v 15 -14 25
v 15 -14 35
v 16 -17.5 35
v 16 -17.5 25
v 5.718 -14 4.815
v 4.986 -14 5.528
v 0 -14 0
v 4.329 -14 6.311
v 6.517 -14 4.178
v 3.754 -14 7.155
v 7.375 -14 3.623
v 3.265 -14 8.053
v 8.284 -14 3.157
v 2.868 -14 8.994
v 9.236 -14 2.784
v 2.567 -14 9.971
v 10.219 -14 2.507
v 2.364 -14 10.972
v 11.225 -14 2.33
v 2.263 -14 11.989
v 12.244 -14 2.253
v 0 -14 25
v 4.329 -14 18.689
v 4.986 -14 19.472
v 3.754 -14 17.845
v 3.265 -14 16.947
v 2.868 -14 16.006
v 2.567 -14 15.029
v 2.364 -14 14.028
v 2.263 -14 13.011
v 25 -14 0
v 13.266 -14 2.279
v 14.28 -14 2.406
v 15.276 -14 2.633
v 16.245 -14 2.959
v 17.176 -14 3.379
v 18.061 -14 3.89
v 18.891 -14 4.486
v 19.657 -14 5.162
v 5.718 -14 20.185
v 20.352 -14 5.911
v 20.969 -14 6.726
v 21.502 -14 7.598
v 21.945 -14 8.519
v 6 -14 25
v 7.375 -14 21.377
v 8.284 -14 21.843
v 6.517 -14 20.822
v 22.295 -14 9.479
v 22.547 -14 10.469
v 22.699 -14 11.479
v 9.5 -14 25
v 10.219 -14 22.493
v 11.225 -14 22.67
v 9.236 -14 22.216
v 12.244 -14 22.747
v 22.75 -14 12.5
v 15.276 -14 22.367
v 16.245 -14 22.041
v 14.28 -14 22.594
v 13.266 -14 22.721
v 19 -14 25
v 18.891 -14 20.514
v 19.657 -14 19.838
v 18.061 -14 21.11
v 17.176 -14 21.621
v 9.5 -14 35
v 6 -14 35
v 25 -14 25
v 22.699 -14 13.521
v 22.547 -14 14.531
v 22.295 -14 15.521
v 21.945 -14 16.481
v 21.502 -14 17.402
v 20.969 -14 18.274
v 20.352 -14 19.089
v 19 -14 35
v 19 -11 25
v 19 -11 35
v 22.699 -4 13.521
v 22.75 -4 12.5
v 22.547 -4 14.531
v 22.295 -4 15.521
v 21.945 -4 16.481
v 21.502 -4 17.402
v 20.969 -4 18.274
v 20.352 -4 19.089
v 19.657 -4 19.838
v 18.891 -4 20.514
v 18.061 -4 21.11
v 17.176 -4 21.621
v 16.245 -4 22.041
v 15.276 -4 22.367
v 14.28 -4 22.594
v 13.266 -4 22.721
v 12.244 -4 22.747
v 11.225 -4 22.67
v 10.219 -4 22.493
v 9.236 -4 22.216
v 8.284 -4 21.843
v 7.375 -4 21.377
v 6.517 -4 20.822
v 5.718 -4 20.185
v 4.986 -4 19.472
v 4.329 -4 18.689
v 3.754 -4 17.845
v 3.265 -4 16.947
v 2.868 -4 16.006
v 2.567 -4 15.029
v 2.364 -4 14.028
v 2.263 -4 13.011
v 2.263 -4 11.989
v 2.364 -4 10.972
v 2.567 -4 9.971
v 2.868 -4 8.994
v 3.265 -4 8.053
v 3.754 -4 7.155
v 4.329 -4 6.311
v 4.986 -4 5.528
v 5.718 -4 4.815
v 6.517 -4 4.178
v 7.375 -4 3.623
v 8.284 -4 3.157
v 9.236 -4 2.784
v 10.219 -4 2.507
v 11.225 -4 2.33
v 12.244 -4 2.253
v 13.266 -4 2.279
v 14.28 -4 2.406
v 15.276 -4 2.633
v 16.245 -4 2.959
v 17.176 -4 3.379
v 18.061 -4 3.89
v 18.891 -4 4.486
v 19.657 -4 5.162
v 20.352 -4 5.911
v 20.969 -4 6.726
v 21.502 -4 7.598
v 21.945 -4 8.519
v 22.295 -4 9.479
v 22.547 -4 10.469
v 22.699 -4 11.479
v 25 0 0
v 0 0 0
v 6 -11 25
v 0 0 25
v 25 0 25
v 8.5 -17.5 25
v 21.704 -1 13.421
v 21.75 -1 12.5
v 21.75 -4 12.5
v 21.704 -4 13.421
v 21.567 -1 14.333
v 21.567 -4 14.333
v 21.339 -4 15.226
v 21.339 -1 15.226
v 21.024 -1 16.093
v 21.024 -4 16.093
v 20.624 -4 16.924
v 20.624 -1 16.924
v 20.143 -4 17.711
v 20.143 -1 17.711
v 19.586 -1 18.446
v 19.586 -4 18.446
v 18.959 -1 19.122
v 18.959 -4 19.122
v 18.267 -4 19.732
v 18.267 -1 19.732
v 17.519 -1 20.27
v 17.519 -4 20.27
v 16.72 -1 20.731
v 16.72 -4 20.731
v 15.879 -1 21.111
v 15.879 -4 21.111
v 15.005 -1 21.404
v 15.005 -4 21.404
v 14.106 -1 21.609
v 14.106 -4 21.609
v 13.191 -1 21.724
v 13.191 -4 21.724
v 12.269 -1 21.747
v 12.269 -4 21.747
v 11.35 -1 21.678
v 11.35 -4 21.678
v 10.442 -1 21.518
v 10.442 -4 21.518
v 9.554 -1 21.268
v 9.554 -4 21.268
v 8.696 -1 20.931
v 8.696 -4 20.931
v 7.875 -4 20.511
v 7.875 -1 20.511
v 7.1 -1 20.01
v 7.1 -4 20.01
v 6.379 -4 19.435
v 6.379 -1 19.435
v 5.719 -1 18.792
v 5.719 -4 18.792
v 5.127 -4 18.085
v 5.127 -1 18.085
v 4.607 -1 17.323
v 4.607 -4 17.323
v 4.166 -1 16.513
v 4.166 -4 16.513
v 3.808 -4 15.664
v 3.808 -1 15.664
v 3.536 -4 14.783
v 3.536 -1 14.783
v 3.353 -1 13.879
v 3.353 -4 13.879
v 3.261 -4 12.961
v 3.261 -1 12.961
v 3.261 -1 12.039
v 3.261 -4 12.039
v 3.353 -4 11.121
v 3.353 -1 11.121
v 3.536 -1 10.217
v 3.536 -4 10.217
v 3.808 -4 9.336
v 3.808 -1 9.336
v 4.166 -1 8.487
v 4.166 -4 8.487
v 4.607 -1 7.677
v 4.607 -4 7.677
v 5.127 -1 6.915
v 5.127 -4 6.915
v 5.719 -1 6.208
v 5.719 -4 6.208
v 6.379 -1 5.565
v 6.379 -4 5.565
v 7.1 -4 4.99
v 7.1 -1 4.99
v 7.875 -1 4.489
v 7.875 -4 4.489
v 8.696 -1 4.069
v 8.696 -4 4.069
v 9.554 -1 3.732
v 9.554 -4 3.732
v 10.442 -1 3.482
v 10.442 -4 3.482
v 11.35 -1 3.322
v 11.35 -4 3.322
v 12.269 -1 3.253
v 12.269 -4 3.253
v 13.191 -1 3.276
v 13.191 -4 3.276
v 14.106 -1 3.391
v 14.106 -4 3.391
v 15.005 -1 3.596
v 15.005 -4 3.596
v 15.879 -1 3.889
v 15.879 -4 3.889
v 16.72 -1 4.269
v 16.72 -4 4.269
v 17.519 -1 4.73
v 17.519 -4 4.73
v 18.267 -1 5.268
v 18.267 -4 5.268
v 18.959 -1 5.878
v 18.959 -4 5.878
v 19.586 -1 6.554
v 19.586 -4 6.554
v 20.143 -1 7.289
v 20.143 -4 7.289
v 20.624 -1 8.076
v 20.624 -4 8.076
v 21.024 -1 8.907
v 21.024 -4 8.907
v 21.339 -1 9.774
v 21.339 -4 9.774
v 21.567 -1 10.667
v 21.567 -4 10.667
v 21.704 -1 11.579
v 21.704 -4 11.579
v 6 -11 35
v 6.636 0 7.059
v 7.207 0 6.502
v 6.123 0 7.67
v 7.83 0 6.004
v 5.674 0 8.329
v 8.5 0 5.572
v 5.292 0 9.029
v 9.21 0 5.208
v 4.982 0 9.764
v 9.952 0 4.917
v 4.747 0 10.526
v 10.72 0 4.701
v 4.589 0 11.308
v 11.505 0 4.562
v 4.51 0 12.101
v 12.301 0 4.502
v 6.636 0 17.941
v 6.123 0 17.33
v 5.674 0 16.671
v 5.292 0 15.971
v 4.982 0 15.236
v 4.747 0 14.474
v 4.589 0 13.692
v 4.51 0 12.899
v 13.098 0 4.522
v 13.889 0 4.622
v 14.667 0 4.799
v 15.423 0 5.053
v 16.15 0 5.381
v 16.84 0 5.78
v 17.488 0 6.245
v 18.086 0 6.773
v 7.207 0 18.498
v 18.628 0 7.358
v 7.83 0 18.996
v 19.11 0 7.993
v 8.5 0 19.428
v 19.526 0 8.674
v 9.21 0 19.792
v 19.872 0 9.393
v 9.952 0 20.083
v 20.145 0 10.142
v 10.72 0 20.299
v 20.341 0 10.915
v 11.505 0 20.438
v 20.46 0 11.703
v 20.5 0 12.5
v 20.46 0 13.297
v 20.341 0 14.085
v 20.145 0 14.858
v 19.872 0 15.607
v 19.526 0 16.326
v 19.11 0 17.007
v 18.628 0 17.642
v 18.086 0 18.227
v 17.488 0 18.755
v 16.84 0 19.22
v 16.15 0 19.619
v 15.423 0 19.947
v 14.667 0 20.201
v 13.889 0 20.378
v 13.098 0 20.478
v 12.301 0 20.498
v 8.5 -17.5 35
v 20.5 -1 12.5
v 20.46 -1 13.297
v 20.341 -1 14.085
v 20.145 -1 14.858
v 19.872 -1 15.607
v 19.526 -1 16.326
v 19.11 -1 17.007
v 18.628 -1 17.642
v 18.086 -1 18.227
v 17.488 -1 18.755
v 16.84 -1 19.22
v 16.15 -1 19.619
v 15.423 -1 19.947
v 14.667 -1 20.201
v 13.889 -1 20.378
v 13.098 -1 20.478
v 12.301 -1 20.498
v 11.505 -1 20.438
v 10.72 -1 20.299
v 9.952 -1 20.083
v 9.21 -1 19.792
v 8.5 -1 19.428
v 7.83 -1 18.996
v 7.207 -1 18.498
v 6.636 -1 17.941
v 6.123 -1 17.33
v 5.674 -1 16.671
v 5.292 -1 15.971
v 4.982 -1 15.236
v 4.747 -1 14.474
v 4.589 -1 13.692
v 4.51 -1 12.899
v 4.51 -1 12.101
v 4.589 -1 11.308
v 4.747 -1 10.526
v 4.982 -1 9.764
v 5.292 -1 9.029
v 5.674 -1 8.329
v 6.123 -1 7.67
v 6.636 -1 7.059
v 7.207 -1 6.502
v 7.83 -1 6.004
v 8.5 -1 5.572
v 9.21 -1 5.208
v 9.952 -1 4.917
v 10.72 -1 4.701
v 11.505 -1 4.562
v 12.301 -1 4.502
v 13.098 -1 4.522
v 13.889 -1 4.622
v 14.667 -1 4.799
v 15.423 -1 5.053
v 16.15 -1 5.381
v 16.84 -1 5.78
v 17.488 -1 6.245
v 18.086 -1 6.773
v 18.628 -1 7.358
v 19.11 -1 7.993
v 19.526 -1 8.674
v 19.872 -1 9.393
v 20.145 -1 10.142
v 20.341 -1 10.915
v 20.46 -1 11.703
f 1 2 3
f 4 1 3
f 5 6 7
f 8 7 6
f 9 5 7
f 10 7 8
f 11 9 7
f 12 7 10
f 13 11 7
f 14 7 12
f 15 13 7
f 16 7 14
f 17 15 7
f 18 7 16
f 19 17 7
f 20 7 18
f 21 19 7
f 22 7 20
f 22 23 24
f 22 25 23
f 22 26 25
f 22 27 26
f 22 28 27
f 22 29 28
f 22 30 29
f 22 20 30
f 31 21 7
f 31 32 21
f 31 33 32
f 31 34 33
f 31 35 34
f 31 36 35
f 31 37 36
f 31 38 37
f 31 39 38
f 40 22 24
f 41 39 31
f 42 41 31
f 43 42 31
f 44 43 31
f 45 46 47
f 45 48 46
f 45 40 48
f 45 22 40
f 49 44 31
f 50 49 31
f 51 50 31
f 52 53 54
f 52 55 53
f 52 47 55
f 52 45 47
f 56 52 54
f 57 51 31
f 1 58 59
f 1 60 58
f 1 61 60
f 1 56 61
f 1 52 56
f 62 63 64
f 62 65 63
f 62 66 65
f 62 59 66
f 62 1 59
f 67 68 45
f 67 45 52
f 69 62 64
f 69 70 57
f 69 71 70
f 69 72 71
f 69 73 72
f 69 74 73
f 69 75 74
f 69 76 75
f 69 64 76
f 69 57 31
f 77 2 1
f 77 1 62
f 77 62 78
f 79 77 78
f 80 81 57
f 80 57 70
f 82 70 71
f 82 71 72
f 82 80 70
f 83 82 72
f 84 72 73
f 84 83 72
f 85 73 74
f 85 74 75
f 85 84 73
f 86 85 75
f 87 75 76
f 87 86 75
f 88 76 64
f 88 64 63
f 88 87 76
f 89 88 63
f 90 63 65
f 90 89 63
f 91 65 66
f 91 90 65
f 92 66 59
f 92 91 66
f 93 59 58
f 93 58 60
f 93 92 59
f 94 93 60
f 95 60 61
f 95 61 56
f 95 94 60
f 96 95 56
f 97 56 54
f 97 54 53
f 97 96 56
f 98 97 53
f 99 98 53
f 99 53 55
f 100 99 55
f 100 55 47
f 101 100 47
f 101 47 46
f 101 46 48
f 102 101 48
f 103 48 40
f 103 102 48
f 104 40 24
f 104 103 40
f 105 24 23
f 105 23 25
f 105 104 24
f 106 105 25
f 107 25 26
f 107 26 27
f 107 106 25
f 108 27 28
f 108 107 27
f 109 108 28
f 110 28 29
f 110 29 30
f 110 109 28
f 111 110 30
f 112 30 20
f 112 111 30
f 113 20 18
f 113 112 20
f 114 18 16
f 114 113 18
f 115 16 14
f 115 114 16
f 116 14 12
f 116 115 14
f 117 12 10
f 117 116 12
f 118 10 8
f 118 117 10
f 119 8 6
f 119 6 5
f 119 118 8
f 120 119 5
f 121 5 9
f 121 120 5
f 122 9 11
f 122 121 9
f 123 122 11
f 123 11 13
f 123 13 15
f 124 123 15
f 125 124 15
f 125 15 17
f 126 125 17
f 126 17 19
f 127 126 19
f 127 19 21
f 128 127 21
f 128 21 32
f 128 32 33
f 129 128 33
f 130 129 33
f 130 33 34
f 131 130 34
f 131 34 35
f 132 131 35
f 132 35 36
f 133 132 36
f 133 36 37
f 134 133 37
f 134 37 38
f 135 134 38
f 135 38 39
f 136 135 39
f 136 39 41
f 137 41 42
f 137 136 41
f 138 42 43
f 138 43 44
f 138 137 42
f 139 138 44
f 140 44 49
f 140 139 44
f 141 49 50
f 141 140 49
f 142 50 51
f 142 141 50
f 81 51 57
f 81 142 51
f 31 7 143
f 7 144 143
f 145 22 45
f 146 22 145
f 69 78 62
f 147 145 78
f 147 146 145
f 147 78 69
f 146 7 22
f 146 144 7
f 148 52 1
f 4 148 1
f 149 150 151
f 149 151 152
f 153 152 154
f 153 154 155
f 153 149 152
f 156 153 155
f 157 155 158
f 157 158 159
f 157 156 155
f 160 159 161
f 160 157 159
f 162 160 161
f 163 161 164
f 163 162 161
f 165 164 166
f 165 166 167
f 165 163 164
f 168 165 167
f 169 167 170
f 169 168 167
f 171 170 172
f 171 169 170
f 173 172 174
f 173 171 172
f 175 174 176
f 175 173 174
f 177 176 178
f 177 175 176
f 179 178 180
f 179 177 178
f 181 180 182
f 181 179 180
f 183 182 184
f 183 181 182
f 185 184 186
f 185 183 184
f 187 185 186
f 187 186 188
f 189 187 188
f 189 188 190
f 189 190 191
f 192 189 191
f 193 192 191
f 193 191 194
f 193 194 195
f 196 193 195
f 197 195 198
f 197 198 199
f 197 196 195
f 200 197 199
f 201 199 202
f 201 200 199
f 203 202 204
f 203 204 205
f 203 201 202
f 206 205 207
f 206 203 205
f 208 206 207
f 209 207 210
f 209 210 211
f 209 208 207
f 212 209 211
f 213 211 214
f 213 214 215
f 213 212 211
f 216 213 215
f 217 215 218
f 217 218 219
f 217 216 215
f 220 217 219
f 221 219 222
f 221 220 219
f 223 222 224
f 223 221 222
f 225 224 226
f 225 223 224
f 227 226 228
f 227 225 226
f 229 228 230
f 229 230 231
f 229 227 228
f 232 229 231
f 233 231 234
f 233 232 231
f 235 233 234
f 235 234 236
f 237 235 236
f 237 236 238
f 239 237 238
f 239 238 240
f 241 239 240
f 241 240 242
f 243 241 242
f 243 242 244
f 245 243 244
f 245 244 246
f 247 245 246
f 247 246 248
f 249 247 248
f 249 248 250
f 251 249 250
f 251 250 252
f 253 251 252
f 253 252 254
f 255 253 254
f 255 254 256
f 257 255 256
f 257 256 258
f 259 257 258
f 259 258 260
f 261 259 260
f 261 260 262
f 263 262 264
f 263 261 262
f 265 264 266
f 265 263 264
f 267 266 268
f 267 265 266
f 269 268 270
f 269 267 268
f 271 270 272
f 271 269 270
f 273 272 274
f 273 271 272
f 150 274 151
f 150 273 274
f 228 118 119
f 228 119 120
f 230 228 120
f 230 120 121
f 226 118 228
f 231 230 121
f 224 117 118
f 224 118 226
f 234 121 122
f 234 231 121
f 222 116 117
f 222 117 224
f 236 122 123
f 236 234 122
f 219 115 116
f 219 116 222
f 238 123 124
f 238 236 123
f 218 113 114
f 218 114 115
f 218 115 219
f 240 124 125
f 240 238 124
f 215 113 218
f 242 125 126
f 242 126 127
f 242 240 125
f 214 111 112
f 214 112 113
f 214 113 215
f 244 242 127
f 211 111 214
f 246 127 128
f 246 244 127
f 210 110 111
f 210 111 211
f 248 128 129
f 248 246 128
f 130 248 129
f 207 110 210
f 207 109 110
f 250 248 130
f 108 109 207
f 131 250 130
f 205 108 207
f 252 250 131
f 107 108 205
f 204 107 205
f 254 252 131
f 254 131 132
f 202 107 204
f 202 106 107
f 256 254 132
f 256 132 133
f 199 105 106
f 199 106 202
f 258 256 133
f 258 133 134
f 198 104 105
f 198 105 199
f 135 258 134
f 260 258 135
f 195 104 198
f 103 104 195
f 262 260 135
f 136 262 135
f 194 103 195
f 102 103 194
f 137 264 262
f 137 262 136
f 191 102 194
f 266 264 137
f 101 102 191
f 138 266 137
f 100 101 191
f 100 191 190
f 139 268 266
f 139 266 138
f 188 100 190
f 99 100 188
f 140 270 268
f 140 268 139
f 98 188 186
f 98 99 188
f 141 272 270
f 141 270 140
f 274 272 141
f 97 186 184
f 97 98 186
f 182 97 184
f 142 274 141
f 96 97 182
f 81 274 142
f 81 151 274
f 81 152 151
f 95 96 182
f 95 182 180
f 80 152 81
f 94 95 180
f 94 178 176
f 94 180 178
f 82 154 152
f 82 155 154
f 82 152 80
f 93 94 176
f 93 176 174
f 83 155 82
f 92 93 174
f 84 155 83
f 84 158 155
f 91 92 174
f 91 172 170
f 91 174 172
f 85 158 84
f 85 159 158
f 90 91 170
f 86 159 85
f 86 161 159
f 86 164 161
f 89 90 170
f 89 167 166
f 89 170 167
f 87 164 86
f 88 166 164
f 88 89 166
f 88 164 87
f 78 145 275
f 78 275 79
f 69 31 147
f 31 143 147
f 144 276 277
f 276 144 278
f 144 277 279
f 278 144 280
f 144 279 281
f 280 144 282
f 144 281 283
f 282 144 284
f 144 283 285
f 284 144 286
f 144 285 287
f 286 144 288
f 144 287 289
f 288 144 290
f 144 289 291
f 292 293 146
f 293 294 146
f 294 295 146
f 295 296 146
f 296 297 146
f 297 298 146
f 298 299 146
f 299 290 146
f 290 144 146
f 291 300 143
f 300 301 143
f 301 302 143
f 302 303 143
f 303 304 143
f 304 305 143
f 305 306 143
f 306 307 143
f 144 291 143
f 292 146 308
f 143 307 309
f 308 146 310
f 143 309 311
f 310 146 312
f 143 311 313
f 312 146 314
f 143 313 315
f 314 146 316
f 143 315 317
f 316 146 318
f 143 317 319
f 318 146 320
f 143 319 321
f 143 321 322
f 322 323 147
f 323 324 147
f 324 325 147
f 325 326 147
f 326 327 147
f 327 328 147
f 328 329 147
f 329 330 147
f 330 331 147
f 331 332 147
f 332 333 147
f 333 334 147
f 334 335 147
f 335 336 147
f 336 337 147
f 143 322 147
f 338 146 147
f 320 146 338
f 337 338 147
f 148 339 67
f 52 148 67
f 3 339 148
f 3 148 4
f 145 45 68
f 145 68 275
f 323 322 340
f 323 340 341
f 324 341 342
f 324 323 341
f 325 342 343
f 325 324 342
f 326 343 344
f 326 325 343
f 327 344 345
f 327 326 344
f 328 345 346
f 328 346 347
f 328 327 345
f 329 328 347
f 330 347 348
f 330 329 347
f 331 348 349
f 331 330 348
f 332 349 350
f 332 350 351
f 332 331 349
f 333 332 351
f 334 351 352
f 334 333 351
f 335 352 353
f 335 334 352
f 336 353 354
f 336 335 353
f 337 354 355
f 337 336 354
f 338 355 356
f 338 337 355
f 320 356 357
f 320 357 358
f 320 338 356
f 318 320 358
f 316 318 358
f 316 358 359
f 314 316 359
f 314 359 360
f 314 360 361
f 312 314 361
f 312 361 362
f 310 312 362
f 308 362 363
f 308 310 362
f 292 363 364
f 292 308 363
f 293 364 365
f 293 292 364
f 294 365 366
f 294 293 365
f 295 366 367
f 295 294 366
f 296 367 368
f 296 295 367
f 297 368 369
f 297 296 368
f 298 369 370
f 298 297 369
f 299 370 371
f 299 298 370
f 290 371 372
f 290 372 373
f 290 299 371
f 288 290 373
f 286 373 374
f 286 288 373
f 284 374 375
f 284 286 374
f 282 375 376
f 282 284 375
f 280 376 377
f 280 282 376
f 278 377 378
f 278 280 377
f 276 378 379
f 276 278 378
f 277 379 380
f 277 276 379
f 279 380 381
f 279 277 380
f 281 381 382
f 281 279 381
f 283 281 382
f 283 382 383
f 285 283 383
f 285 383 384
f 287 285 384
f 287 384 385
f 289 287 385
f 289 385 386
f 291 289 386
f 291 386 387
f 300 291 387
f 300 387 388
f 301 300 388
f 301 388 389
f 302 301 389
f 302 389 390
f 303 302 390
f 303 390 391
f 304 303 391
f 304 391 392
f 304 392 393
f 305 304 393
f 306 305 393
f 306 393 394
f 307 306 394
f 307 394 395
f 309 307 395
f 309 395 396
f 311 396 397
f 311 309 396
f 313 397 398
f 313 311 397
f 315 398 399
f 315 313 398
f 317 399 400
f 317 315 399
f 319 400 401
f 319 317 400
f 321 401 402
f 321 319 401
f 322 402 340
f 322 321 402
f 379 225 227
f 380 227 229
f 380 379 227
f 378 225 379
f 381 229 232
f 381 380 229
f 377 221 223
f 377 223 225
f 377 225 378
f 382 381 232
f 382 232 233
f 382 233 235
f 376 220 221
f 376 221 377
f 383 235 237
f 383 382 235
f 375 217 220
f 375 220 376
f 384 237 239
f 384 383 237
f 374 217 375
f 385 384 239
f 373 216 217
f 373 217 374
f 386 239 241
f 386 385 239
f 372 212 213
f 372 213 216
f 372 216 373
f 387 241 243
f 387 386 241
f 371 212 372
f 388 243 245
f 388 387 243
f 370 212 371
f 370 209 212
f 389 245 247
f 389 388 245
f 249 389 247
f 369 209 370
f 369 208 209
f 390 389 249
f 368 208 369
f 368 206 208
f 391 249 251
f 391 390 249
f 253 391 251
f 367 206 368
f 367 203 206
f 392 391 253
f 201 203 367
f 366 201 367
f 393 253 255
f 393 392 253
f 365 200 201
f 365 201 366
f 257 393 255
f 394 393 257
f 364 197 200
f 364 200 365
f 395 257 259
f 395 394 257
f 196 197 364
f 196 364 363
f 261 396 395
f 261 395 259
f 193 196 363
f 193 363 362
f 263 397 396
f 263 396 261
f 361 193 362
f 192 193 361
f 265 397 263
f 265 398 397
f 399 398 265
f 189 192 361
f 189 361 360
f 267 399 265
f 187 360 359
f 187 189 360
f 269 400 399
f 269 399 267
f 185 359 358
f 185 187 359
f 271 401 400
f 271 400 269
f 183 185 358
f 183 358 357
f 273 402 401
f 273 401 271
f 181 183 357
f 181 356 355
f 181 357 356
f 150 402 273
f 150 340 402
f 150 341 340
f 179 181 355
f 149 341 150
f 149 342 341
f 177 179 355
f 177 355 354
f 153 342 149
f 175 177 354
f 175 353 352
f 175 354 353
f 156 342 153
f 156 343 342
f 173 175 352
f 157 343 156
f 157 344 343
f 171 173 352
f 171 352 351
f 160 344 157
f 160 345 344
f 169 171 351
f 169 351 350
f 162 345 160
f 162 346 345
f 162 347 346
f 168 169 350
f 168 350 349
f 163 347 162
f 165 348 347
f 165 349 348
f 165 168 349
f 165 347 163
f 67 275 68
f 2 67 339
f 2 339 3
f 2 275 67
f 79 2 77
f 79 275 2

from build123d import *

# Parameters (mm, degrees)
F0_W      = 25
F0_H      = 25
F0_R      = 10.25
F0_R_2    = 9.25
F0_R_3    = 8
F1_DEPTH  = 1
F2_W      = 25
F2_H      = 25
F2_R      = 9.25
F3_DEPTH  = 3
F4_W      = 25
F4_H      = 25
F4_R      = 10.25
F5_DEPTH  = 10
F6_W      = 13
F6_H      = 3
F7_DEPTH  = 10
F8_W      = 7.5
F8_H      = 10
F9_DEPTH  = 3.5
F11_DEPTH = 10
F12_DEPTH = 10


with BuildPart() as f1:
    # F0 (on Front) → F1 (new body)
    with BuildSketch(Plane.XZ):
        with Locations((12.5, 12.5)):
            Rectangle(F0_W, F0_H)
        with Locations((12.5, 12.5)):
            Circle(F0_R, mode=Mode.SUBTRACT)
        with Locations((12.5, 12.5)):
            Circle(F0_R)
        with Locations((12.5, 12.5)):
            Circle(F0_R_2, mode=Mode.SUBTRACT)
        with Locations((12.5, 12.5)):
            Circle(F0_R_2)
        with Locations((12.5, 12.5)):
            Circle(F0_R_3, mode=Mode.SUBTRACT)
    extrude(amount=F1_DEPTH)

    # F2 (on face) → F3 (join)
    with BuildSketch(Plane.XZ.offset(1)):
        with Locations((12.5, 12.5)):
            Rectangle(F2_W, F2_H)
        with Locations((12.5, 12.5)):
            Circle(F2_R, mode=Mode.SUBTRACT)
    extrude(amount=F3_DEPTH)

    # F4 (on face) → F5 (join)
    with BuildSketch(Plane.XZ.offset(4)):
        with Locations((12.5, 12.5)):
            Rectangle(F4_W, F4_H)
        with Locations((12.5, 12.5)):
            Circle(F4_R, mode=Mode.SUBTRACT)
    extrude(amount=F5_DEPTH)

    # F6 (on face) → F7 (join)
    with BuildSketch(Plane.XY.offset(25)):
        with Locations((12.5, -12.5)):
            Rectangle(F6_W, F6_H)
    extrude(amount=F7_DEPTH)

    # F8 (on face) → F9 (join)
    with BuildSketch(Plane.XZ.offset(14)):
        with Locations((12.25, 30)):
            Rectangle(F8_W, F8_H)
    extrude(amount=F9_DEPTH)

    # F10 (on face) → F11 (cut)
    with BuildSketch(Plane.XY.offset(35)):
        Polygon((8.5, -14), (8.5, -17.5), (9.5, -14), align=None)
    extrude(amount=-F11_DEPTH, mode=Mode.SUBTRACT)

    # F10 (on face) → F12 (cut)
    with BuildSketch(Plane.XY.offset(35)):
        Polygon((15, -14), (16, -17.5), (16, -14), align=None)
    extrude(amount=-F12_DEPTH, mode=Mode.SUBTRACT)


solid = f1.part
